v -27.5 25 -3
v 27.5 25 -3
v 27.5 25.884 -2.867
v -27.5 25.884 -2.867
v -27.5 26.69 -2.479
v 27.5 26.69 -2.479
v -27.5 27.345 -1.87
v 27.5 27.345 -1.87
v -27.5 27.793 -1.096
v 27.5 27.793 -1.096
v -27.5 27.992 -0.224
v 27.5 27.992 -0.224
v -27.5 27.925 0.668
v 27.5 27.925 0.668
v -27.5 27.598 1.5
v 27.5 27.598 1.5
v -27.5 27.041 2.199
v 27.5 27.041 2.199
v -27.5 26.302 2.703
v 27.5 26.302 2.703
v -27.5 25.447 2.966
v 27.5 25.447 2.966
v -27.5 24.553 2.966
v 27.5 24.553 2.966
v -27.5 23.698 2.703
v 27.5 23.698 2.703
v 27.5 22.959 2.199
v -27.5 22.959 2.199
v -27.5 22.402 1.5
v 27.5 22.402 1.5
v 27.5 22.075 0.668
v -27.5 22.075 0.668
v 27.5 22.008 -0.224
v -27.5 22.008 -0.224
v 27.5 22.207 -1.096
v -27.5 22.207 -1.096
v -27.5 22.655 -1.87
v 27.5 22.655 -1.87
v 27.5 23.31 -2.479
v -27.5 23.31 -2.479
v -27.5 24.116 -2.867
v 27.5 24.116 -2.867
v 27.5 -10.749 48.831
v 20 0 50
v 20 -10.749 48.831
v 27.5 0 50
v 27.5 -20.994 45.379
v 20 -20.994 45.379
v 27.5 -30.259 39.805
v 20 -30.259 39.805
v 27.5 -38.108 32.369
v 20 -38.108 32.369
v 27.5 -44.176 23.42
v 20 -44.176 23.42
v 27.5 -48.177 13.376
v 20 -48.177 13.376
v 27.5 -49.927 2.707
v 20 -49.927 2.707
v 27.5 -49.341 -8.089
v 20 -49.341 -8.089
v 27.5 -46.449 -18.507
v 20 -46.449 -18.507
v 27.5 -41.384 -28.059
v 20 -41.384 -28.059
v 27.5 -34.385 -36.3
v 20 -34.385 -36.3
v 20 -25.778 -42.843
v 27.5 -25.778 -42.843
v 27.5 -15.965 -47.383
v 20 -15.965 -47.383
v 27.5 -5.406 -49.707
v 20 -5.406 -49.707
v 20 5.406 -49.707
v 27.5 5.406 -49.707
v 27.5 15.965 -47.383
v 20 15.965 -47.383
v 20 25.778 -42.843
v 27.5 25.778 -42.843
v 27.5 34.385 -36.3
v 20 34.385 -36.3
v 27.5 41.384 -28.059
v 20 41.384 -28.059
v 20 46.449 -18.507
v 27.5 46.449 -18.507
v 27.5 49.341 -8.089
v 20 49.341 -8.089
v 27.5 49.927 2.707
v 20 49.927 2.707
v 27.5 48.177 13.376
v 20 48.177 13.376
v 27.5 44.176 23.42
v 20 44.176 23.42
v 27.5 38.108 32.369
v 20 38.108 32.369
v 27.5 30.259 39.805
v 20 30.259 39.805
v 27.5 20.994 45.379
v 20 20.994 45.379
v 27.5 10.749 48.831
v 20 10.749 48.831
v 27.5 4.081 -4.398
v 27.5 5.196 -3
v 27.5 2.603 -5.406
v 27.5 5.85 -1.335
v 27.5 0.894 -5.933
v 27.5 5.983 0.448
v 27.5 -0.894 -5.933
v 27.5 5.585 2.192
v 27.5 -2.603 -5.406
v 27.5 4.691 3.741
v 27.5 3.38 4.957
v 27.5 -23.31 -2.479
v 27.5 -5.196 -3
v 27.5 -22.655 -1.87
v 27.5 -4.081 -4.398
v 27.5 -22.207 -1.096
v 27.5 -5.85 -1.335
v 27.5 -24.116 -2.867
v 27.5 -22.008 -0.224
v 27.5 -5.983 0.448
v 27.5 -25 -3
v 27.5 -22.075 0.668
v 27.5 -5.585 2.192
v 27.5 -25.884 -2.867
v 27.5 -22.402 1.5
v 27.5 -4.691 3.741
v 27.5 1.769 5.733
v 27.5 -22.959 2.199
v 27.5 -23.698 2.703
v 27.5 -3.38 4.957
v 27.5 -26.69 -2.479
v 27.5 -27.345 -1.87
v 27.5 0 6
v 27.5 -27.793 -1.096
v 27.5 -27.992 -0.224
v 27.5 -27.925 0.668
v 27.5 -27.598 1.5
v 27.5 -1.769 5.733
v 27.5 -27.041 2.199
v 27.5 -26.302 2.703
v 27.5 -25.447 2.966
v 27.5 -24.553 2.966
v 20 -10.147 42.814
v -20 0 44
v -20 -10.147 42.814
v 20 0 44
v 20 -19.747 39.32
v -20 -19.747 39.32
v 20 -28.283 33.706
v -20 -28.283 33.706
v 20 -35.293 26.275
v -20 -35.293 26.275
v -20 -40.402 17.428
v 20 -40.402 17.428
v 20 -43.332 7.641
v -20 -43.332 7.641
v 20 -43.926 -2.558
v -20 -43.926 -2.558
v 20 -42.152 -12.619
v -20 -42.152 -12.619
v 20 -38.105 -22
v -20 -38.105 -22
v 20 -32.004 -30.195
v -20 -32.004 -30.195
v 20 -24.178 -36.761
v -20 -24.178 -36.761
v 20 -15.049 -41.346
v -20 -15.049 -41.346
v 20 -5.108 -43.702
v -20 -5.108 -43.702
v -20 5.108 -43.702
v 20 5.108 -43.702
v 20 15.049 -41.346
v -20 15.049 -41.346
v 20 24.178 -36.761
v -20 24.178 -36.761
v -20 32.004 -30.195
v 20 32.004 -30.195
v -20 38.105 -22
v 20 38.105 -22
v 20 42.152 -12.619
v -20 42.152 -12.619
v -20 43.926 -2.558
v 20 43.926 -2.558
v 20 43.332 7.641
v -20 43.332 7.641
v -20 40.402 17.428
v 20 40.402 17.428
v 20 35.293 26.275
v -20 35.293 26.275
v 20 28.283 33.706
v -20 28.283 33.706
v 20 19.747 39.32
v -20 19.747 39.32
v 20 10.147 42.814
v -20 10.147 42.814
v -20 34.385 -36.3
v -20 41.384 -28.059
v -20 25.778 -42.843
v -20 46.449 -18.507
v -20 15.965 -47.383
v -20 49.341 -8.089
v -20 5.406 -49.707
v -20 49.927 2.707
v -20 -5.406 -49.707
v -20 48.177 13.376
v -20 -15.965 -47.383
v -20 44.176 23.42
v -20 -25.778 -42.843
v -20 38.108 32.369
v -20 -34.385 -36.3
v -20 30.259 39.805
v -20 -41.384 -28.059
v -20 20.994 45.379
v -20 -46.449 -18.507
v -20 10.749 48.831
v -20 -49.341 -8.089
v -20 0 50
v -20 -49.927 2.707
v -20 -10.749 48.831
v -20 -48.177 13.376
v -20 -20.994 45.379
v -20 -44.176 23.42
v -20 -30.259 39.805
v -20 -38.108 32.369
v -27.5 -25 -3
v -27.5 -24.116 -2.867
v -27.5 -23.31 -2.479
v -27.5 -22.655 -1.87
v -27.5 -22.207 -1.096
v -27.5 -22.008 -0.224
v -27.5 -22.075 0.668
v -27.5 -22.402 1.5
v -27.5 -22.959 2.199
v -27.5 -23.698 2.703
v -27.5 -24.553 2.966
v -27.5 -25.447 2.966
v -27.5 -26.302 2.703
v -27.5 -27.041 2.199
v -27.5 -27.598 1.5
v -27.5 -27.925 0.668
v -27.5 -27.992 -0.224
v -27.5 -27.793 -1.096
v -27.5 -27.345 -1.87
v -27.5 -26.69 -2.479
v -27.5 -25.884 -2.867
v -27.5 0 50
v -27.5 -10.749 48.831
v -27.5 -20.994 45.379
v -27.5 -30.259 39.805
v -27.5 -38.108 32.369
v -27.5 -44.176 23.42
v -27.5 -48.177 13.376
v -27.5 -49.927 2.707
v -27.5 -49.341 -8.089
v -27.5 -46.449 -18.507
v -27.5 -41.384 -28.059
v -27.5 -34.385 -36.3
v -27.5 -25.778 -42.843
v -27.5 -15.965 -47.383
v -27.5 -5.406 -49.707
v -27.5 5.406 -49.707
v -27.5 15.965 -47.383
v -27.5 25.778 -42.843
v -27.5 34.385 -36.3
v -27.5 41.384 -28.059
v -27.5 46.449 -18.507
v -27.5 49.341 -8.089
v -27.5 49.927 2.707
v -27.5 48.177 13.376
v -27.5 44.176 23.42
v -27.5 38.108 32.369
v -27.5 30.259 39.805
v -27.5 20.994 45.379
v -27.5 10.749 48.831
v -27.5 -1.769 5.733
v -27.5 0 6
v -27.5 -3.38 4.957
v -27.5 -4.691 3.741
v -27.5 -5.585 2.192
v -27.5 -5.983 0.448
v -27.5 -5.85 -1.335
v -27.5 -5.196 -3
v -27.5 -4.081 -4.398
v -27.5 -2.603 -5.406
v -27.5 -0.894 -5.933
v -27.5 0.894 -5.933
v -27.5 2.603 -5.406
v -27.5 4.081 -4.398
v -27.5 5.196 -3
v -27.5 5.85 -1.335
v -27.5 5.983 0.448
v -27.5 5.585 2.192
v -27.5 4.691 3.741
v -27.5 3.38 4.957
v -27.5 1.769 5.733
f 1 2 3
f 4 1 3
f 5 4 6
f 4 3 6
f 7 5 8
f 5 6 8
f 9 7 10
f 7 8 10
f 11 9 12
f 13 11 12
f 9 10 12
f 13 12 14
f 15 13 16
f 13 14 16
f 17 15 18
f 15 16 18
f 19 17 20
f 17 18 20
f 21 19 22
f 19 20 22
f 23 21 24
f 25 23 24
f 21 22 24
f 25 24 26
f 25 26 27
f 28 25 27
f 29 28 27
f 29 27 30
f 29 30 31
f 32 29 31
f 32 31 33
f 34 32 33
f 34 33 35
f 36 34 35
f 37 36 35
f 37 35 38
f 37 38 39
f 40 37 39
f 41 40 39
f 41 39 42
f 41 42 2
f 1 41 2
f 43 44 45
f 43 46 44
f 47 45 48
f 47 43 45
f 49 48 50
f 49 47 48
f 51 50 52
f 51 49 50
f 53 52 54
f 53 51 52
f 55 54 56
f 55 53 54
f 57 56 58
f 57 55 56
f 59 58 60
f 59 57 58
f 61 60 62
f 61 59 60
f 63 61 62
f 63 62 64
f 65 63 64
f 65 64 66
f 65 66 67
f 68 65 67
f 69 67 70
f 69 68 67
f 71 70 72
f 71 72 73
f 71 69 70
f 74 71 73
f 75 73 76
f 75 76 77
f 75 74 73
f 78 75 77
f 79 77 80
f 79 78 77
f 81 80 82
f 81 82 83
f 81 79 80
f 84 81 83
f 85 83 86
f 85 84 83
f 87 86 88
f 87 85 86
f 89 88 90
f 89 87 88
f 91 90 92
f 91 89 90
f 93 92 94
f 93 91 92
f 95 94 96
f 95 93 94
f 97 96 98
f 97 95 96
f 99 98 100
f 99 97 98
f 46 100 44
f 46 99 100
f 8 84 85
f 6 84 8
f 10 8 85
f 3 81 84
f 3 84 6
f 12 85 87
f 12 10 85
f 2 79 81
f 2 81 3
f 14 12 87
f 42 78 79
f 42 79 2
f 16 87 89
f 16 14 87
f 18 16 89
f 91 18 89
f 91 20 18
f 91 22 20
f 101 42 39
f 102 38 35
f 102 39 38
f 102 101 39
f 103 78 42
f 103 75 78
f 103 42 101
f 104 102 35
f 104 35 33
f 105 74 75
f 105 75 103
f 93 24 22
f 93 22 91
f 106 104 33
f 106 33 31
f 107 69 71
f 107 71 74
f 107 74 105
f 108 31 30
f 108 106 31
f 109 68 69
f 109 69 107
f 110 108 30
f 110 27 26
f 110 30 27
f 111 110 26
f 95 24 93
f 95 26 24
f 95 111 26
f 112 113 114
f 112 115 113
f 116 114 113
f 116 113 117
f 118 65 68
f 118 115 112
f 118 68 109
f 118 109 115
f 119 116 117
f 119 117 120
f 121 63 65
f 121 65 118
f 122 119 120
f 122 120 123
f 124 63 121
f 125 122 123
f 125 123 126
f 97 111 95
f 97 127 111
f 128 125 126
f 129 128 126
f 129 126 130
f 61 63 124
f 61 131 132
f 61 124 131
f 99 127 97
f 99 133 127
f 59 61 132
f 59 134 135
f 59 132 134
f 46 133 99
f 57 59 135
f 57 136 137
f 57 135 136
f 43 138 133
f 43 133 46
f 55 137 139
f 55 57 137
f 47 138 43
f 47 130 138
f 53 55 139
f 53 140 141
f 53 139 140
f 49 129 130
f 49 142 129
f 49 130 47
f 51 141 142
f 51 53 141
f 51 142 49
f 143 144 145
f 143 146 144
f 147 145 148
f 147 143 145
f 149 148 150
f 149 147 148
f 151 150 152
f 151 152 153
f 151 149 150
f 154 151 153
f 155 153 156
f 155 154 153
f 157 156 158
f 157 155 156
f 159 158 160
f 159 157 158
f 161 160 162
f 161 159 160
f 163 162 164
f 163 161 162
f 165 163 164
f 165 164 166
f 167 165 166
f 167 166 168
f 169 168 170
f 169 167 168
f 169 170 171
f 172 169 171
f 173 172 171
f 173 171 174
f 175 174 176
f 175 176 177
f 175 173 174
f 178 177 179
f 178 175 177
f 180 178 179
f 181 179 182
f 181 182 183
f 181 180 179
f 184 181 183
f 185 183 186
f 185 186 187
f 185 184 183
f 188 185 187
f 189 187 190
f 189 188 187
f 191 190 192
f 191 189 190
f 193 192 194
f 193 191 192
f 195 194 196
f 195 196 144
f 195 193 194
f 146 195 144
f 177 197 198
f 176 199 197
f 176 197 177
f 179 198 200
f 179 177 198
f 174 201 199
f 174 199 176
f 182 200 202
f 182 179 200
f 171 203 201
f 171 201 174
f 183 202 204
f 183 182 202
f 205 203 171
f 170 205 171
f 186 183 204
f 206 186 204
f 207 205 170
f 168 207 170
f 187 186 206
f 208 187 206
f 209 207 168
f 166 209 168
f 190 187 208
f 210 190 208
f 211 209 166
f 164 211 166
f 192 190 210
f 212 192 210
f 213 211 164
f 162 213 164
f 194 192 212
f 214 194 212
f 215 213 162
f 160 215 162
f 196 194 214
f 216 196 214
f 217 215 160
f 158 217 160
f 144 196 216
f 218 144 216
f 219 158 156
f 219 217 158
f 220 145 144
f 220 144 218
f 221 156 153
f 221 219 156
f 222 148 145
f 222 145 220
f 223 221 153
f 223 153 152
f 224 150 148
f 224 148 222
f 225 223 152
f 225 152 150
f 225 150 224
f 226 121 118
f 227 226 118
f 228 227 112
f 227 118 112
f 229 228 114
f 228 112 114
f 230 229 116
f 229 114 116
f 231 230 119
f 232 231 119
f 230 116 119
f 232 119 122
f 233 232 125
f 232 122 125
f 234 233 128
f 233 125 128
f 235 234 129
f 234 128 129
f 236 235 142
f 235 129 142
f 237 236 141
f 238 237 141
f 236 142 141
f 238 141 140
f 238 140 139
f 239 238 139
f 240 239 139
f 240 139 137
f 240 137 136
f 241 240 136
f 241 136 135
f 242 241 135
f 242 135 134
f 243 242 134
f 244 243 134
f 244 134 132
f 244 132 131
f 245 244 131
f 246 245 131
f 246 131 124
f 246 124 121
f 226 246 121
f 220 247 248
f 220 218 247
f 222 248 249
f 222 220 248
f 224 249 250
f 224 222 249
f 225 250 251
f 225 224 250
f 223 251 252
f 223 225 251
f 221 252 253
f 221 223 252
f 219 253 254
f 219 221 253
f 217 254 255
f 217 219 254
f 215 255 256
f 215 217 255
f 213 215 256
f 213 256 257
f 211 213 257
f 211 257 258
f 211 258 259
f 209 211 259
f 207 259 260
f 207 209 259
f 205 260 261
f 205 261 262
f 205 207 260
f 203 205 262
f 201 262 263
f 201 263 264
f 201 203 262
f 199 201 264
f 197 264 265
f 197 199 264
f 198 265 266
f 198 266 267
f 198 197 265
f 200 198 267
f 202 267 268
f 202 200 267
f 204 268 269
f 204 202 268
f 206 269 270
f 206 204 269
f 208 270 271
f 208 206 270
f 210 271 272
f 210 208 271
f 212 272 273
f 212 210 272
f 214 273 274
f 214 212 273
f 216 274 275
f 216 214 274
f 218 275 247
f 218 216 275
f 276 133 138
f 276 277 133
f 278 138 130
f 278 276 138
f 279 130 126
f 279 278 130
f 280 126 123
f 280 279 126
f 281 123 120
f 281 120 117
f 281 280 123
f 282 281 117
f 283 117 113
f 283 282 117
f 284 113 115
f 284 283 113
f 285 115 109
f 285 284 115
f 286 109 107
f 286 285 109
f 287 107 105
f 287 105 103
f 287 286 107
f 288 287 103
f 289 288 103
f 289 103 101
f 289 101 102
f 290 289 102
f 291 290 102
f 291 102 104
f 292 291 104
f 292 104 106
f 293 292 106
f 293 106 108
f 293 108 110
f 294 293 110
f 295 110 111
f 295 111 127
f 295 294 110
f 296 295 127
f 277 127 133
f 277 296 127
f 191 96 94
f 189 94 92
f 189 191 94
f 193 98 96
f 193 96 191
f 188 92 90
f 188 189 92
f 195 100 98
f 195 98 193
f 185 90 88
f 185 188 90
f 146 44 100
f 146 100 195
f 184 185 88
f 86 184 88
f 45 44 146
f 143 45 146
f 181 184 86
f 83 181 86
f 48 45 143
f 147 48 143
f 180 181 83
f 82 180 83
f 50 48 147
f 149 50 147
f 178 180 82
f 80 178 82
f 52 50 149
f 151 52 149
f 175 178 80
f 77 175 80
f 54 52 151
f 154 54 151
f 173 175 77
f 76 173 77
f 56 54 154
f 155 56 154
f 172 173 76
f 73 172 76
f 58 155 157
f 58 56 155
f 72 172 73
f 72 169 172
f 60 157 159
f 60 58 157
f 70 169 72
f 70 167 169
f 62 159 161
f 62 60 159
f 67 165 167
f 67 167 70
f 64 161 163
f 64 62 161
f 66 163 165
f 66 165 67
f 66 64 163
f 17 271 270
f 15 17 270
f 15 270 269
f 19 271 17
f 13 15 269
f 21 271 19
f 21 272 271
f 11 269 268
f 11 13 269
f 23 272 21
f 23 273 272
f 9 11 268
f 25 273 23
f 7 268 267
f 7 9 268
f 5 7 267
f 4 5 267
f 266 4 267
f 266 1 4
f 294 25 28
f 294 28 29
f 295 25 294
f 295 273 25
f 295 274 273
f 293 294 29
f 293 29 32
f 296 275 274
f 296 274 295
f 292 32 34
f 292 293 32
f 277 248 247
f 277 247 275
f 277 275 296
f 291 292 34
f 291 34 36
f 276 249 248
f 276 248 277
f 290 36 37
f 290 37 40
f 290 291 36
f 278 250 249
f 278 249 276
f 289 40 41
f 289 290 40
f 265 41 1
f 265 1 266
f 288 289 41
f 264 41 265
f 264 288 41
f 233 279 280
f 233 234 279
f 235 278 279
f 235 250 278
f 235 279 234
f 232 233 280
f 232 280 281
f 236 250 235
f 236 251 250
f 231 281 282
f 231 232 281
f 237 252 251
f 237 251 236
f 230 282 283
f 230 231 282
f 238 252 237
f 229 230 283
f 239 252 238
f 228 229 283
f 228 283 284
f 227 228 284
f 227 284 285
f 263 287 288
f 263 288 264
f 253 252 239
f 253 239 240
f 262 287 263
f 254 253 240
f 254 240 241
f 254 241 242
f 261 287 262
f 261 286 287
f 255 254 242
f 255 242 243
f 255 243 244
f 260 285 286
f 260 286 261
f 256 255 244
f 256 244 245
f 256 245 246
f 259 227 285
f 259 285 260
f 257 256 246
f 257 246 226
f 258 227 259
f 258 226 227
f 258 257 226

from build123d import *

# Parameters (mm, degrees)
SKETCH3_R          = 3
CUT_EXTRUDE1_DEPTH = 90.582364336


with BuildPart() as part:
    # Sketch1 → Revolve1 (revolve)
    with BuildSketch(Plane.XY, mode=Mode.PRIVATE) as revolve1_sk:
        Polygon((20, 50), (27.5, 50), (27.5, 6), (-27.5, 6), (-27.5, 50), (-20, 50), (-20, 44), (20, 44), align=None)
    revolve(revolve1_sk.sketch.rotate(Axis((-137.236084453, 0, 0), (1, 0, 0)), 90), axis=Axis((-137.236084453, 0, 0), (1, 0, 0)))

    # Sketch3 → Cut-Extrude1 (cut, through all)
    with BuildSketch(Plane(origin=(27.5, 0, 0), x_dir=(0, 0, -1), z_dir=(1, 0, 0))):
        with Locations((0, 25)):
            Circle(SKETCH3_R)
        with Locations((0, -25)):
            Circle(SKETCH3_R)
    extrude(amount=-CUT_EXTRUDE1_DEPTH, mode=Mode.SUBTRACT)


solid = part.part
